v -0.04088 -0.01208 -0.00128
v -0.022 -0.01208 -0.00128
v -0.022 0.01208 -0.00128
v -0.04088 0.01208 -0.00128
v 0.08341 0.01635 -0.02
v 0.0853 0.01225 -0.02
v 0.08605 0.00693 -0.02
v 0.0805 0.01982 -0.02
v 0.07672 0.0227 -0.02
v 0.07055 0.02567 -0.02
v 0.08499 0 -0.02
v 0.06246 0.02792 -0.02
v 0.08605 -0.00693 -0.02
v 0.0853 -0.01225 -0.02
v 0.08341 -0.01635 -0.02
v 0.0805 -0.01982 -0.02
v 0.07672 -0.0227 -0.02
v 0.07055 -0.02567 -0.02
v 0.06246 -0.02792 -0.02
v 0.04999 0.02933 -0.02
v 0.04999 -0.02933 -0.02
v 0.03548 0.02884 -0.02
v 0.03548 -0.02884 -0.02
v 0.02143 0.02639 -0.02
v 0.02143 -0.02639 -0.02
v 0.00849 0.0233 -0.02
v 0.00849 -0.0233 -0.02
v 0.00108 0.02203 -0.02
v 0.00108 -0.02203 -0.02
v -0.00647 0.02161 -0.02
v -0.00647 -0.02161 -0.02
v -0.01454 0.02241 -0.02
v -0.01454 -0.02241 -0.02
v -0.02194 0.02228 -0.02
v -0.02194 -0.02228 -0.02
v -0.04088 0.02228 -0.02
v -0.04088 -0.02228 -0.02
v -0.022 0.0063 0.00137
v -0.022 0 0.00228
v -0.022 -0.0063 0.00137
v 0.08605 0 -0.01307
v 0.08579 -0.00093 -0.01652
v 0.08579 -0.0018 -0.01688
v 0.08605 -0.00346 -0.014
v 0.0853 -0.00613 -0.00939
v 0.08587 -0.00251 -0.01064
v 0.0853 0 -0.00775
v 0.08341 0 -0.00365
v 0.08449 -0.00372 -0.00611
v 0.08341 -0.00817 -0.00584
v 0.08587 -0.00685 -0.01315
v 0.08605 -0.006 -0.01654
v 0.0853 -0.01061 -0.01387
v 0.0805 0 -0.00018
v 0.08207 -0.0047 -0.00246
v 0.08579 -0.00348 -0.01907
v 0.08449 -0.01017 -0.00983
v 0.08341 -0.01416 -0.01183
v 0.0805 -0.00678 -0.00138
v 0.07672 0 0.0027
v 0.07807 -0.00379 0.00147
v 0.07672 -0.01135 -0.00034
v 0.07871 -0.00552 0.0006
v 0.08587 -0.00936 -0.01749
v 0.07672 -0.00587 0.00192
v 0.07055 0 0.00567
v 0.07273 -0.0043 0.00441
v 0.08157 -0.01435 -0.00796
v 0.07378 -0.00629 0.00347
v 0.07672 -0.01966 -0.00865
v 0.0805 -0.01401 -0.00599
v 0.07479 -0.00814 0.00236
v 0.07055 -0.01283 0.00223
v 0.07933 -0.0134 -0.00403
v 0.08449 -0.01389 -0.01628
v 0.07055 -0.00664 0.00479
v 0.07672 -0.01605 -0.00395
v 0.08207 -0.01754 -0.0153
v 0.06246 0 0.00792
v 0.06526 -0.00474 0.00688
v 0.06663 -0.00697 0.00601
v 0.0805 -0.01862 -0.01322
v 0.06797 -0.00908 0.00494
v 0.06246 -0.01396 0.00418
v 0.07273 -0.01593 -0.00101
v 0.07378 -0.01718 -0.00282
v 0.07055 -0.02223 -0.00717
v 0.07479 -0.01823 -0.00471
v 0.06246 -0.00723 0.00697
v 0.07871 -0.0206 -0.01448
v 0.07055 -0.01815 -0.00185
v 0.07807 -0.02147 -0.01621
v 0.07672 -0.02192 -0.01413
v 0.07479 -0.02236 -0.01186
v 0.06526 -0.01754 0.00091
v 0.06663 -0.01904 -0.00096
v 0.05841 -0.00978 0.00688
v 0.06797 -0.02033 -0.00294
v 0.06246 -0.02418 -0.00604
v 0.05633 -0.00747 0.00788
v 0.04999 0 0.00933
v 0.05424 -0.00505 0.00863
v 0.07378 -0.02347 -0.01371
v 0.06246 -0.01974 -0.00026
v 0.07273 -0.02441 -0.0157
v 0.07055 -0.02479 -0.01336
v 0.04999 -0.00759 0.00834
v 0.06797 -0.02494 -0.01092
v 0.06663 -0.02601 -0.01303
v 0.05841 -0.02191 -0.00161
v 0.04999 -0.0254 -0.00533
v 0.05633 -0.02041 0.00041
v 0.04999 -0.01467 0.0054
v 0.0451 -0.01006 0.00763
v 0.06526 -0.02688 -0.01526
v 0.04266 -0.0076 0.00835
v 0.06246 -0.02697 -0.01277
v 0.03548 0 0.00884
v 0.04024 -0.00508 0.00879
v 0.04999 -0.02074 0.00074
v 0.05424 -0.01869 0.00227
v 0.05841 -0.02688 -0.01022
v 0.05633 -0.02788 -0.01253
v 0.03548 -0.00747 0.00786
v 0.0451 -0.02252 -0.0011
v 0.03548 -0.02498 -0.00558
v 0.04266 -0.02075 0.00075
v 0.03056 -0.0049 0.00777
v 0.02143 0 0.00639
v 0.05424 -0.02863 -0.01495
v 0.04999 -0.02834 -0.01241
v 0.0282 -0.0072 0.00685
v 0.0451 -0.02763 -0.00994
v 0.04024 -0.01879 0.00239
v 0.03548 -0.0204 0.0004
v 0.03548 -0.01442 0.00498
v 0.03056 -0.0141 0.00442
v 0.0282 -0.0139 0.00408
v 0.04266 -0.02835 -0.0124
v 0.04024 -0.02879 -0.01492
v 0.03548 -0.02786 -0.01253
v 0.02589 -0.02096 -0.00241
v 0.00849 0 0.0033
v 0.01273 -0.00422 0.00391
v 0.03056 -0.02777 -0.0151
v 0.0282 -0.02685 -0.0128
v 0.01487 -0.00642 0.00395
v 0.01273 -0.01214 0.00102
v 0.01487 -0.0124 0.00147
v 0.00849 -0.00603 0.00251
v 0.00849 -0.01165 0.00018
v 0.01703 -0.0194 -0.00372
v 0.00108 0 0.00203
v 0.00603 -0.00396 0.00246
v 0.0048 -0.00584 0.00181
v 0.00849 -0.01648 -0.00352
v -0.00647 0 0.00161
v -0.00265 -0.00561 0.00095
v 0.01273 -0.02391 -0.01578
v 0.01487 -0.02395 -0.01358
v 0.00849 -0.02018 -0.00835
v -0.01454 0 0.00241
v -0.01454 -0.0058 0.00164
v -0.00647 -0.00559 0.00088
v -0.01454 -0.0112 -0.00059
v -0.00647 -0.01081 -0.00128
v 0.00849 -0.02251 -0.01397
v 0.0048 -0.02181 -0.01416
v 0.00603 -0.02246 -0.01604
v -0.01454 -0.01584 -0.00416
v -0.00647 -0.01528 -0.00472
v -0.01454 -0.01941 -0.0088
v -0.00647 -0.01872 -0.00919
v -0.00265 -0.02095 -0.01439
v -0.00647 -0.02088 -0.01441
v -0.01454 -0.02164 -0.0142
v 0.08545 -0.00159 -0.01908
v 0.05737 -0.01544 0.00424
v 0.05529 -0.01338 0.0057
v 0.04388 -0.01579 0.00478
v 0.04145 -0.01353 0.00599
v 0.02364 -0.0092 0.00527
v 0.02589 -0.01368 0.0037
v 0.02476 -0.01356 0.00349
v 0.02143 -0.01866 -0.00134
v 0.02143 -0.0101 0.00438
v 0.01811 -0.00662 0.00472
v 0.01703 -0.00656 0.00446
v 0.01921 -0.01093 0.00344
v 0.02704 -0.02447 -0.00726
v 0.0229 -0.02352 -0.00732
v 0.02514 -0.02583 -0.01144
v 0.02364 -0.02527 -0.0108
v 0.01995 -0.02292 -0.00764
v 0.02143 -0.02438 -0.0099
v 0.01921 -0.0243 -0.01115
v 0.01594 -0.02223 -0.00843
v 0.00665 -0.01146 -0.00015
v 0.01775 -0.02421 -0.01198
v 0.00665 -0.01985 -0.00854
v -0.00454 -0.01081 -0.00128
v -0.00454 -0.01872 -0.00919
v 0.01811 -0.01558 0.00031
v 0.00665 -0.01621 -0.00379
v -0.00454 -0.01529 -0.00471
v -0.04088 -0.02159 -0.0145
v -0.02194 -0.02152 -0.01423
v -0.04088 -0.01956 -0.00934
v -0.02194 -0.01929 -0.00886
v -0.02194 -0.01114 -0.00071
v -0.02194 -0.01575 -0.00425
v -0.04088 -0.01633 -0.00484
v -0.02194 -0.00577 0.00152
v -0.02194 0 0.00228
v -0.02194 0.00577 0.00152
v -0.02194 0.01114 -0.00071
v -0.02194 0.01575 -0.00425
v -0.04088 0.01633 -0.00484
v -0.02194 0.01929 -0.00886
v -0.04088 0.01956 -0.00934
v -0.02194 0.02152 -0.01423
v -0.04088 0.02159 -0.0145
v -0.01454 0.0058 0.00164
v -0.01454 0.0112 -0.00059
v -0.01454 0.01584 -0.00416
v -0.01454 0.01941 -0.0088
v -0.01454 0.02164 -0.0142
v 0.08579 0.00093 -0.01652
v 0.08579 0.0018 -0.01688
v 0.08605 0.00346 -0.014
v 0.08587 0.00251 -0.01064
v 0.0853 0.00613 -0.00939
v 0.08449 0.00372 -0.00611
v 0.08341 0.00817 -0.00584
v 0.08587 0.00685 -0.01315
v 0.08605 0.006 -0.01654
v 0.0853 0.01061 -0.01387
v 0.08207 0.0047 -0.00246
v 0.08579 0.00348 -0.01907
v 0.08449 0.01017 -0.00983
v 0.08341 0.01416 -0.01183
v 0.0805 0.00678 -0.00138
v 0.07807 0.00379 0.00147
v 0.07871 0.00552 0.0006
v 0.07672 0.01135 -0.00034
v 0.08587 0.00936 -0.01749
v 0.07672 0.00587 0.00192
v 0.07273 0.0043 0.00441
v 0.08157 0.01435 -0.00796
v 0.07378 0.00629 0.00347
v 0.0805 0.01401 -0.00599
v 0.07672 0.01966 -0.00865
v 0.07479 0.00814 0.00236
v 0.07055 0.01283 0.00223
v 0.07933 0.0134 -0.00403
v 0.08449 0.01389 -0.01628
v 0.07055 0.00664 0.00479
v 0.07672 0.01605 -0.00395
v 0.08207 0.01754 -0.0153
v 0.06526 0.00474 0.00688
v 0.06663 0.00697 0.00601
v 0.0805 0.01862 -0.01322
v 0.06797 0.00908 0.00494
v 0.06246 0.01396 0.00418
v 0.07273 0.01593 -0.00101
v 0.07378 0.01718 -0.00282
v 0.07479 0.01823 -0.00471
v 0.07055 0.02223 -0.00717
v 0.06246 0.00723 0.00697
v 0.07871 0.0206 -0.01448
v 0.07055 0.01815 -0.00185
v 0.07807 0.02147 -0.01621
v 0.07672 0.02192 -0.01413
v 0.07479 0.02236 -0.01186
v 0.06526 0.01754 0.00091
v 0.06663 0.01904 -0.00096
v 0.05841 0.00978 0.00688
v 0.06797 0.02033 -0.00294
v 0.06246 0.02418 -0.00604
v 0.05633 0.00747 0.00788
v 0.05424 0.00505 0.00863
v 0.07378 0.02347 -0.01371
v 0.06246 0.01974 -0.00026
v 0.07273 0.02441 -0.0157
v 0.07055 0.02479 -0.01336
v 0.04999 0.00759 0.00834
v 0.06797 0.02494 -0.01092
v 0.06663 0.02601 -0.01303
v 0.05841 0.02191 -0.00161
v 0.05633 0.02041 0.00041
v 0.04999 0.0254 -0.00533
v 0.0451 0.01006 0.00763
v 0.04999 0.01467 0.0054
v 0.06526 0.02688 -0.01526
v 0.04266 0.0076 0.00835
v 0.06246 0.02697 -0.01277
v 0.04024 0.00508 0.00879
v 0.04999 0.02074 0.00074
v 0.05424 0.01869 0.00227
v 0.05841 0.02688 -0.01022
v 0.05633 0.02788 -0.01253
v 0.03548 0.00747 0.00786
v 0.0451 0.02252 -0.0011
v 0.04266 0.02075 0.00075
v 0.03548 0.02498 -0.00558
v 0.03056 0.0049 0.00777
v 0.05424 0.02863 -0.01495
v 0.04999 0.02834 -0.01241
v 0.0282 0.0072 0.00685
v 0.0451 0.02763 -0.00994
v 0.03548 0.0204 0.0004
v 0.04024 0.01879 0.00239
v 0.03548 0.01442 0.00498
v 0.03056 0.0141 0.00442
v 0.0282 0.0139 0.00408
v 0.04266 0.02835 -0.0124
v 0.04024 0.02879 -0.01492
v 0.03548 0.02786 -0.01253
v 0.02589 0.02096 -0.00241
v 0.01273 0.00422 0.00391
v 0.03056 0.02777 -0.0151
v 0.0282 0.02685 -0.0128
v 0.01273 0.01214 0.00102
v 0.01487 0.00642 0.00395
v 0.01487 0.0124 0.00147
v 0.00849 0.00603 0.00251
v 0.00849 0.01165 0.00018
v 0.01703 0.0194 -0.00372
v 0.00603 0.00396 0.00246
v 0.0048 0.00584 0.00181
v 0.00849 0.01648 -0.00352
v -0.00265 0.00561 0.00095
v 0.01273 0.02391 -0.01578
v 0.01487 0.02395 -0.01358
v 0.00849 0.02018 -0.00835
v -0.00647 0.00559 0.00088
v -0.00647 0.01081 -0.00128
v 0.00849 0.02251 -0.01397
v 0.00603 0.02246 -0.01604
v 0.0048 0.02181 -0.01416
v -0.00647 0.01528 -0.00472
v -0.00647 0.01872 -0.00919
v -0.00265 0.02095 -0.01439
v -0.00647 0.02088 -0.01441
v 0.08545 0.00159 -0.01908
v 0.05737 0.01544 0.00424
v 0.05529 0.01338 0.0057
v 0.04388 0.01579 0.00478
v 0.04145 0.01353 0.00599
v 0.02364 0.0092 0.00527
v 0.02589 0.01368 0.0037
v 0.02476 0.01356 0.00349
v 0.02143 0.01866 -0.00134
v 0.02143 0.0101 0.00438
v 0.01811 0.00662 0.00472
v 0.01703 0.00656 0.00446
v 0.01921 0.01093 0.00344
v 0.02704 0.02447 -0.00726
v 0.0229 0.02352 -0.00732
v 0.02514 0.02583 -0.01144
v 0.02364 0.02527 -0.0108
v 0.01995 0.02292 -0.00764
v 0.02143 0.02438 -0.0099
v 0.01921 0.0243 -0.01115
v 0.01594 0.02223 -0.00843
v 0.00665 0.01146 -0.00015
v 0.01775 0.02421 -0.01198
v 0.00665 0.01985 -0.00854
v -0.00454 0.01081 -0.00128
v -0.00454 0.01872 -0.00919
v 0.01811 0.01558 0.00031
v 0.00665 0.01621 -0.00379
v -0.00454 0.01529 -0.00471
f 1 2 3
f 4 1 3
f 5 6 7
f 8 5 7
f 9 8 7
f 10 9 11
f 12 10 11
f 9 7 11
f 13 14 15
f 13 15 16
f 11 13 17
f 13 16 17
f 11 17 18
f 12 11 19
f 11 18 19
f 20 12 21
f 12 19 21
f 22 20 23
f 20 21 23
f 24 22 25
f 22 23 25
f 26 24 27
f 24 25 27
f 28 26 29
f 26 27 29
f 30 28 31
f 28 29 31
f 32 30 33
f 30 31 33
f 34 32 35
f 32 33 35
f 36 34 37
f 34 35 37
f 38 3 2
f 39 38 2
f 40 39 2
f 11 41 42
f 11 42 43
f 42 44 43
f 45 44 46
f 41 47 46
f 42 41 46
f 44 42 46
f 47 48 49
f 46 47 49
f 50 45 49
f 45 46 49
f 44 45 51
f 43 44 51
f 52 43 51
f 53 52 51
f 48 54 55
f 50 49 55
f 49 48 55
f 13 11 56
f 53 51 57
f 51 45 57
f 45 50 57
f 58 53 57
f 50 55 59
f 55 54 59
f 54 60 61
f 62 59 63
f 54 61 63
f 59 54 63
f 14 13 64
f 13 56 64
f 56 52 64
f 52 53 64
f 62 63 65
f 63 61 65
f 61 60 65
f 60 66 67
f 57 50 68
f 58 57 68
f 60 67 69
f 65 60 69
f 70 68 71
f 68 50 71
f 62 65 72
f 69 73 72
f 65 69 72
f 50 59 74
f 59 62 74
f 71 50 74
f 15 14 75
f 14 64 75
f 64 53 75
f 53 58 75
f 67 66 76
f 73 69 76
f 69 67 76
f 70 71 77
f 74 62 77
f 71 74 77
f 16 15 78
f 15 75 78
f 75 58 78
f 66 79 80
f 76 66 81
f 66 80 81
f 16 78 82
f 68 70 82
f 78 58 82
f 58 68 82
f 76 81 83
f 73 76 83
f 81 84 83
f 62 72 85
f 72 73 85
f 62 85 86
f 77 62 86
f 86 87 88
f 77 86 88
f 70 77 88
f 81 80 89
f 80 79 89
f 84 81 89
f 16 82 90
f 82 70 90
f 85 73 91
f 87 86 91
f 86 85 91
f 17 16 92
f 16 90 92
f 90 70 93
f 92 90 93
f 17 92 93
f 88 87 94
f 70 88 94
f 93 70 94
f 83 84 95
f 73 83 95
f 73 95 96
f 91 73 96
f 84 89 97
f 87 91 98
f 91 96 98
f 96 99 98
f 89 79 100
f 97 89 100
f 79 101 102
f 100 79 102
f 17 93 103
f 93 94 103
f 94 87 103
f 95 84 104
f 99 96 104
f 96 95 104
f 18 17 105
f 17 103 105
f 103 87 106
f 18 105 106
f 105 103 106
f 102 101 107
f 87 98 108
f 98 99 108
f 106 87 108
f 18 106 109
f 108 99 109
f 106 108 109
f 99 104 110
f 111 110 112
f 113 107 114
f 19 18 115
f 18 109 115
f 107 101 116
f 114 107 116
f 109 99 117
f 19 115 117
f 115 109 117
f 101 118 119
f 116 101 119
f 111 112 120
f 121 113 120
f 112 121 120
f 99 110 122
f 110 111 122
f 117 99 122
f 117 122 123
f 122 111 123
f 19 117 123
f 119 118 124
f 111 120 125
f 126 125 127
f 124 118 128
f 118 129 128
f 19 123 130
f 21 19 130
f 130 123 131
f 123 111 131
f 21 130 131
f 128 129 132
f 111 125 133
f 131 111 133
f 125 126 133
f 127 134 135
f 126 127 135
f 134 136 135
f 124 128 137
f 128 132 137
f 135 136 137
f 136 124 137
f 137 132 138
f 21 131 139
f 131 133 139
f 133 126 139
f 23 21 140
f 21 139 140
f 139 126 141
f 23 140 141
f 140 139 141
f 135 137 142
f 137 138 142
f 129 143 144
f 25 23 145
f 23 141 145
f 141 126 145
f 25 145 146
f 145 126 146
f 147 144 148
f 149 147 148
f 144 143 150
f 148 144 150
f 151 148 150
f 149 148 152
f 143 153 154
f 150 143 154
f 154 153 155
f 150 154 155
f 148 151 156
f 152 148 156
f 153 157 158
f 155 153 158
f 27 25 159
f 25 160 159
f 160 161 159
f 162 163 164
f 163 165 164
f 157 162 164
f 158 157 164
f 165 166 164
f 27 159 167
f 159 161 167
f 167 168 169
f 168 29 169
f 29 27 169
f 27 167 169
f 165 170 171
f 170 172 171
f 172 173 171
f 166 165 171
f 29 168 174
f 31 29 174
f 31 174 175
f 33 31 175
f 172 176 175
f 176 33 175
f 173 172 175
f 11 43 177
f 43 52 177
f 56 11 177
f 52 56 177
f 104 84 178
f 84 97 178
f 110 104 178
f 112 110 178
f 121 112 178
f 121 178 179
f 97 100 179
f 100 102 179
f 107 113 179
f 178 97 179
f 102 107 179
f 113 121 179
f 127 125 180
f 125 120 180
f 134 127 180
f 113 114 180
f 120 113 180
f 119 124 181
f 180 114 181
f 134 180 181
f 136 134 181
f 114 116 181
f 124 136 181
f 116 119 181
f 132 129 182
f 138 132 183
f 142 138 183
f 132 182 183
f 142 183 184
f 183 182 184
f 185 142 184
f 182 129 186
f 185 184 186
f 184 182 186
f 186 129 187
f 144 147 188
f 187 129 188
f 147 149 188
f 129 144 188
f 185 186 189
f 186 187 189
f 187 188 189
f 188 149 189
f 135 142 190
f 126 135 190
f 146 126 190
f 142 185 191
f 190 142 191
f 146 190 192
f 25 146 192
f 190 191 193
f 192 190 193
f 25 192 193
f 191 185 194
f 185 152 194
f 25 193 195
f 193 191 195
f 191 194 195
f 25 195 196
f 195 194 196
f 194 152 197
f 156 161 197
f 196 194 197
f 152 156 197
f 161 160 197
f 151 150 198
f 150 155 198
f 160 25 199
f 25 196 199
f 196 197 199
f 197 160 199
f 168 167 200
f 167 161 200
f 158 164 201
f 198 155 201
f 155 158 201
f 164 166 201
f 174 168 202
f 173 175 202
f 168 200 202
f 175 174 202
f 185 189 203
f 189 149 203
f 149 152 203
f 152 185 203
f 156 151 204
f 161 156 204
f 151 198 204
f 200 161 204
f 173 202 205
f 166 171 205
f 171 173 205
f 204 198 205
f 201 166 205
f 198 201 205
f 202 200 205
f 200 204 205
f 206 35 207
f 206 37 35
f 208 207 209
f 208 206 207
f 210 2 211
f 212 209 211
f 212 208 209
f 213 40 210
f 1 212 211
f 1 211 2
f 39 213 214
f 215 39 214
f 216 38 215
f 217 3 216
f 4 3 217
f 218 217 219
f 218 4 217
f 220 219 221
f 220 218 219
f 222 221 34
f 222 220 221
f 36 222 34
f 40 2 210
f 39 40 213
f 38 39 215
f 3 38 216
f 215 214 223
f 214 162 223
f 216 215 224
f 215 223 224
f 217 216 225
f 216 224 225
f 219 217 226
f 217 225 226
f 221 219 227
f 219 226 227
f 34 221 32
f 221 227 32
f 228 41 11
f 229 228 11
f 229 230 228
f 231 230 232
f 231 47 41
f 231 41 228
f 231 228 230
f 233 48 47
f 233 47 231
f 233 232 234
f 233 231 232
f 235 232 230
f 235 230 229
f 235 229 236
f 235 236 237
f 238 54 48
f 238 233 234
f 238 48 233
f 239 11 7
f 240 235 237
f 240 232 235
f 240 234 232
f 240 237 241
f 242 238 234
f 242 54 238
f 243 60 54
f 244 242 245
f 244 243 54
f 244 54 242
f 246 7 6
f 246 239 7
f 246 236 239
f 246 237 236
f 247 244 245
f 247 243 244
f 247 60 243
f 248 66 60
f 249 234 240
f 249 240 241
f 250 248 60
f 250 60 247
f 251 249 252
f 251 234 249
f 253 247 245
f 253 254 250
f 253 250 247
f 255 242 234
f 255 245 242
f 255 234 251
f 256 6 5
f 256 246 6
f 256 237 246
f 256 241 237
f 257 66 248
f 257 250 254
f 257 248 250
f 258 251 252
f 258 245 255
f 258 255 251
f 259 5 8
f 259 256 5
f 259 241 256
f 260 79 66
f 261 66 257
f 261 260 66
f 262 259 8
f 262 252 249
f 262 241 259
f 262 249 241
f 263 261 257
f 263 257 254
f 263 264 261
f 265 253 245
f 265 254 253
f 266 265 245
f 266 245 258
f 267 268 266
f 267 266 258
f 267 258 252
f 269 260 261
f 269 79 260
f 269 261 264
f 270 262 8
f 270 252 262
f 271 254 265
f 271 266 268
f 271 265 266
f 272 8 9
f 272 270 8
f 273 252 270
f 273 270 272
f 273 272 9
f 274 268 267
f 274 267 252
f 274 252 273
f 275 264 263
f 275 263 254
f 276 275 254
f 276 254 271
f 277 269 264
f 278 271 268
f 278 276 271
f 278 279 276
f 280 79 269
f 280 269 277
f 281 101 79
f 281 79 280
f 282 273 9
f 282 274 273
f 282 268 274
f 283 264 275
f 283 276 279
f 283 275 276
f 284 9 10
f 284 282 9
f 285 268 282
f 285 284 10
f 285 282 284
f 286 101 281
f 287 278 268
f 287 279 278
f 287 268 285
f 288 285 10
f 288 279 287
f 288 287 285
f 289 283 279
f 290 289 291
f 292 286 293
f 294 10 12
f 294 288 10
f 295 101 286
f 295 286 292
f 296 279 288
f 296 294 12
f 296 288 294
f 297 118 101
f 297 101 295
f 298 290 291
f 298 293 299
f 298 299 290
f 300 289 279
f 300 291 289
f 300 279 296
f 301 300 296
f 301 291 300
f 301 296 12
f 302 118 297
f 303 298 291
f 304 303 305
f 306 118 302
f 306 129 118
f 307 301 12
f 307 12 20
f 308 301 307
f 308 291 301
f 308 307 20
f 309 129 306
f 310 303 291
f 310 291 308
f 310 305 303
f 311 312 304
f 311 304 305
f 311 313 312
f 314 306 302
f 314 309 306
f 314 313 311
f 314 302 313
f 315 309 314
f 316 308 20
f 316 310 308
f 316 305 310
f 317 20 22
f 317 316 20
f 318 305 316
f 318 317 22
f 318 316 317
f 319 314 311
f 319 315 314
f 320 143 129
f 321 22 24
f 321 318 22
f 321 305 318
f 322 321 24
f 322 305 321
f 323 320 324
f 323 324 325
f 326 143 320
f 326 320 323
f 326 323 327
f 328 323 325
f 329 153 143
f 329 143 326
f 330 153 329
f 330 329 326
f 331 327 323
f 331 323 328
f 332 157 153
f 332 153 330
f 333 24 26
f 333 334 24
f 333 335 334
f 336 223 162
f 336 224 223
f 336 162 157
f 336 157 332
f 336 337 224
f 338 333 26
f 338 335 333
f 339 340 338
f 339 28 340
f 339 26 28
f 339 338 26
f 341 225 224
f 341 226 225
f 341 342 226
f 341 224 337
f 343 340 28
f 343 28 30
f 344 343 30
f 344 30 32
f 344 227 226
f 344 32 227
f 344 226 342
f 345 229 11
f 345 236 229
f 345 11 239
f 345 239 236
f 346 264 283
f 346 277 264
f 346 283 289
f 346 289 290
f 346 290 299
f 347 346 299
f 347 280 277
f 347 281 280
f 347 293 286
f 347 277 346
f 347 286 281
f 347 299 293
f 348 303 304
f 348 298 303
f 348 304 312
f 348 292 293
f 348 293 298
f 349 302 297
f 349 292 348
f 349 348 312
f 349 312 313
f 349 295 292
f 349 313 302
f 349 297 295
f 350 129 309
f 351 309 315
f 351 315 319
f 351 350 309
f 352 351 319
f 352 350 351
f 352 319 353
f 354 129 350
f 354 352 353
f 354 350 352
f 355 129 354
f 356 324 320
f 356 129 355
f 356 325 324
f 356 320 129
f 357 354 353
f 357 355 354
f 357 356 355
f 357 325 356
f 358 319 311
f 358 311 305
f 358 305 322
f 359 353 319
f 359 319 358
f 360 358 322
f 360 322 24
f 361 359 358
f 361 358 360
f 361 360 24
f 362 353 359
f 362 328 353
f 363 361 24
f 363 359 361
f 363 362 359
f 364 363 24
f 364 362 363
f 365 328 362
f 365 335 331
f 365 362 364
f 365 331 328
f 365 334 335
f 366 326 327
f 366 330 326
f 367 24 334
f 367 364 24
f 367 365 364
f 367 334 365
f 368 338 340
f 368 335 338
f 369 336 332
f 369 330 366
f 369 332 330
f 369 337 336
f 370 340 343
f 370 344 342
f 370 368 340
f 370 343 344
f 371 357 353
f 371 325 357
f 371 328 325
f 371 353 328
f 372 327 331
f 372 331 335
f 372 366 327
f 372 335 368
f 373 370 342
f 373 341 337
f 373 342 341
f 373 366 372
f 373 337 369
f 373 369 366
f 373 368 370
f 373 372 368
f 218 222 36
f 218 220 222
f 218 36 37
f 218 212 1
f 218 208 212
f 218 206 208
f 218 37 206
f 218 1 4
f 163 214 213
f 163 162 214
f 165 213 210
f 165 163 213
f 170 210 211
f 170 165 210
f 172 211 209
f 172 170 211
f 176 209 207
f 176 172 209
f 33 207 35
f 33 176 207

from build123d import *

# Parameters (mm, degrees)
REVOLVE2_ANGLE           = 90
REVOLVE2_OTHER_WAY_ANGLE = 90
SKETCH4_W                = 0.01470915
SKETCH4_H                = 0.03384268
CUT_EXTRUDE1_DEPTH       = 10


with BuildPart() as part:
    # Sketch2 → Revolve2 (revolve)
    with BuildSketch(Plane(origin=(0, 0, 0), x_dir=(1, 0, 0), z_dir=(0, 1, 0))):
        with BuildLine():
            Line((-0.040882846, 0.02), (0.059999999, 0.02))
            Line((0.059999999, 0.02), (0.084987644, 0.02))
            add(Edge.make_bspline(
                [(0.084987644, 0.02), (0.092702041, -0.006864779), (0.032288643, -0.015505972), (0.002470911, 0.000663285), (-0.014544096, -0.002408108)],
                knots=[0, 0, 0, 0, 0.59331664, 1, 1, 1, 1], degree=3))
            add(Edge.make_bspline(
                [(-0.021937137, -0.002277318), (-0.018183593, -0.002107007), (-0.014544096, -0.002408108)],
                knots=[0, 0, 0, 0.074406521, 0.074406521, 0.074406521], degree=2))
            Line((-0.021937137, -0.002277318), (-0.040882846, -0.002277318))
            Line((-0.040882846, -0.002277318), (-0.040882846, 0.02))
        make_face()
    revolve(axis=Axis((-0.040882846, 0, -0.02), (1, 0, 0)), revolution_arc=REVOLVE2_ANGLE)

    # Sketch2 → Revolve2 other way (revolve)
    with BuildSketch(Plane(origin=(0, 0, 0), x_dir=(1, 0, 0), z_dir=(0, 1, 0))):
        with BuildLine():
            Line((-0.040882846, 0.02), (0.059999999, 0.02))
            Line((0.059999999, 0.02), (0.084987644, 0.02))
            add(Edge.make_bspline(
                [(0.084987644, 0.02), (0.092702041, -0.006864779), (0.032288643, -0.015505972), (0.002470911, 0.000663285), (-0.014544096, -0.002408108)],
                knots=[0, 0, 0, 0, 0.59331664, 1, 1, 1, 1], degree=3))
            add(Edge.make_bspline(
                [(-0.021937137, -0.002277318), (-0.018183593, -0.002107007), (-0.014544096, -0.002408108)],
                knots=[0, 0, 0, 0.074406521, 0.074406521, 0.074406521], degree=2))
            Line((-0.021937137, -0.002277318), (-0.040882846, -0.002277318))
            Line((-0.040882846, -0.002277318), (-0.040882846, 0.02))
        make_face()
    revolve(axis=Axis((-0.040882846, 0, -0.02), (-1, 0, 0)), revolution_arc=REVOLVE2_OTHER_WAY_ANGLE)

    # Sketch4 → Cut-Extrude1 (cut)
    with BuildSketch(Plane(origin=(-0.022, 0, 0), x_dir=(0, 0, -1), z_dir=(1, 0, 0))):
        with Locations((-0.006071578, 0)):
            Rectangle(SKETCH4_W, SKETCH4_H)
    extrude(amount=-CUT_EXTRUDE1_DEPTH, mode=Mode.SUBTRACT)


solid = part.part
